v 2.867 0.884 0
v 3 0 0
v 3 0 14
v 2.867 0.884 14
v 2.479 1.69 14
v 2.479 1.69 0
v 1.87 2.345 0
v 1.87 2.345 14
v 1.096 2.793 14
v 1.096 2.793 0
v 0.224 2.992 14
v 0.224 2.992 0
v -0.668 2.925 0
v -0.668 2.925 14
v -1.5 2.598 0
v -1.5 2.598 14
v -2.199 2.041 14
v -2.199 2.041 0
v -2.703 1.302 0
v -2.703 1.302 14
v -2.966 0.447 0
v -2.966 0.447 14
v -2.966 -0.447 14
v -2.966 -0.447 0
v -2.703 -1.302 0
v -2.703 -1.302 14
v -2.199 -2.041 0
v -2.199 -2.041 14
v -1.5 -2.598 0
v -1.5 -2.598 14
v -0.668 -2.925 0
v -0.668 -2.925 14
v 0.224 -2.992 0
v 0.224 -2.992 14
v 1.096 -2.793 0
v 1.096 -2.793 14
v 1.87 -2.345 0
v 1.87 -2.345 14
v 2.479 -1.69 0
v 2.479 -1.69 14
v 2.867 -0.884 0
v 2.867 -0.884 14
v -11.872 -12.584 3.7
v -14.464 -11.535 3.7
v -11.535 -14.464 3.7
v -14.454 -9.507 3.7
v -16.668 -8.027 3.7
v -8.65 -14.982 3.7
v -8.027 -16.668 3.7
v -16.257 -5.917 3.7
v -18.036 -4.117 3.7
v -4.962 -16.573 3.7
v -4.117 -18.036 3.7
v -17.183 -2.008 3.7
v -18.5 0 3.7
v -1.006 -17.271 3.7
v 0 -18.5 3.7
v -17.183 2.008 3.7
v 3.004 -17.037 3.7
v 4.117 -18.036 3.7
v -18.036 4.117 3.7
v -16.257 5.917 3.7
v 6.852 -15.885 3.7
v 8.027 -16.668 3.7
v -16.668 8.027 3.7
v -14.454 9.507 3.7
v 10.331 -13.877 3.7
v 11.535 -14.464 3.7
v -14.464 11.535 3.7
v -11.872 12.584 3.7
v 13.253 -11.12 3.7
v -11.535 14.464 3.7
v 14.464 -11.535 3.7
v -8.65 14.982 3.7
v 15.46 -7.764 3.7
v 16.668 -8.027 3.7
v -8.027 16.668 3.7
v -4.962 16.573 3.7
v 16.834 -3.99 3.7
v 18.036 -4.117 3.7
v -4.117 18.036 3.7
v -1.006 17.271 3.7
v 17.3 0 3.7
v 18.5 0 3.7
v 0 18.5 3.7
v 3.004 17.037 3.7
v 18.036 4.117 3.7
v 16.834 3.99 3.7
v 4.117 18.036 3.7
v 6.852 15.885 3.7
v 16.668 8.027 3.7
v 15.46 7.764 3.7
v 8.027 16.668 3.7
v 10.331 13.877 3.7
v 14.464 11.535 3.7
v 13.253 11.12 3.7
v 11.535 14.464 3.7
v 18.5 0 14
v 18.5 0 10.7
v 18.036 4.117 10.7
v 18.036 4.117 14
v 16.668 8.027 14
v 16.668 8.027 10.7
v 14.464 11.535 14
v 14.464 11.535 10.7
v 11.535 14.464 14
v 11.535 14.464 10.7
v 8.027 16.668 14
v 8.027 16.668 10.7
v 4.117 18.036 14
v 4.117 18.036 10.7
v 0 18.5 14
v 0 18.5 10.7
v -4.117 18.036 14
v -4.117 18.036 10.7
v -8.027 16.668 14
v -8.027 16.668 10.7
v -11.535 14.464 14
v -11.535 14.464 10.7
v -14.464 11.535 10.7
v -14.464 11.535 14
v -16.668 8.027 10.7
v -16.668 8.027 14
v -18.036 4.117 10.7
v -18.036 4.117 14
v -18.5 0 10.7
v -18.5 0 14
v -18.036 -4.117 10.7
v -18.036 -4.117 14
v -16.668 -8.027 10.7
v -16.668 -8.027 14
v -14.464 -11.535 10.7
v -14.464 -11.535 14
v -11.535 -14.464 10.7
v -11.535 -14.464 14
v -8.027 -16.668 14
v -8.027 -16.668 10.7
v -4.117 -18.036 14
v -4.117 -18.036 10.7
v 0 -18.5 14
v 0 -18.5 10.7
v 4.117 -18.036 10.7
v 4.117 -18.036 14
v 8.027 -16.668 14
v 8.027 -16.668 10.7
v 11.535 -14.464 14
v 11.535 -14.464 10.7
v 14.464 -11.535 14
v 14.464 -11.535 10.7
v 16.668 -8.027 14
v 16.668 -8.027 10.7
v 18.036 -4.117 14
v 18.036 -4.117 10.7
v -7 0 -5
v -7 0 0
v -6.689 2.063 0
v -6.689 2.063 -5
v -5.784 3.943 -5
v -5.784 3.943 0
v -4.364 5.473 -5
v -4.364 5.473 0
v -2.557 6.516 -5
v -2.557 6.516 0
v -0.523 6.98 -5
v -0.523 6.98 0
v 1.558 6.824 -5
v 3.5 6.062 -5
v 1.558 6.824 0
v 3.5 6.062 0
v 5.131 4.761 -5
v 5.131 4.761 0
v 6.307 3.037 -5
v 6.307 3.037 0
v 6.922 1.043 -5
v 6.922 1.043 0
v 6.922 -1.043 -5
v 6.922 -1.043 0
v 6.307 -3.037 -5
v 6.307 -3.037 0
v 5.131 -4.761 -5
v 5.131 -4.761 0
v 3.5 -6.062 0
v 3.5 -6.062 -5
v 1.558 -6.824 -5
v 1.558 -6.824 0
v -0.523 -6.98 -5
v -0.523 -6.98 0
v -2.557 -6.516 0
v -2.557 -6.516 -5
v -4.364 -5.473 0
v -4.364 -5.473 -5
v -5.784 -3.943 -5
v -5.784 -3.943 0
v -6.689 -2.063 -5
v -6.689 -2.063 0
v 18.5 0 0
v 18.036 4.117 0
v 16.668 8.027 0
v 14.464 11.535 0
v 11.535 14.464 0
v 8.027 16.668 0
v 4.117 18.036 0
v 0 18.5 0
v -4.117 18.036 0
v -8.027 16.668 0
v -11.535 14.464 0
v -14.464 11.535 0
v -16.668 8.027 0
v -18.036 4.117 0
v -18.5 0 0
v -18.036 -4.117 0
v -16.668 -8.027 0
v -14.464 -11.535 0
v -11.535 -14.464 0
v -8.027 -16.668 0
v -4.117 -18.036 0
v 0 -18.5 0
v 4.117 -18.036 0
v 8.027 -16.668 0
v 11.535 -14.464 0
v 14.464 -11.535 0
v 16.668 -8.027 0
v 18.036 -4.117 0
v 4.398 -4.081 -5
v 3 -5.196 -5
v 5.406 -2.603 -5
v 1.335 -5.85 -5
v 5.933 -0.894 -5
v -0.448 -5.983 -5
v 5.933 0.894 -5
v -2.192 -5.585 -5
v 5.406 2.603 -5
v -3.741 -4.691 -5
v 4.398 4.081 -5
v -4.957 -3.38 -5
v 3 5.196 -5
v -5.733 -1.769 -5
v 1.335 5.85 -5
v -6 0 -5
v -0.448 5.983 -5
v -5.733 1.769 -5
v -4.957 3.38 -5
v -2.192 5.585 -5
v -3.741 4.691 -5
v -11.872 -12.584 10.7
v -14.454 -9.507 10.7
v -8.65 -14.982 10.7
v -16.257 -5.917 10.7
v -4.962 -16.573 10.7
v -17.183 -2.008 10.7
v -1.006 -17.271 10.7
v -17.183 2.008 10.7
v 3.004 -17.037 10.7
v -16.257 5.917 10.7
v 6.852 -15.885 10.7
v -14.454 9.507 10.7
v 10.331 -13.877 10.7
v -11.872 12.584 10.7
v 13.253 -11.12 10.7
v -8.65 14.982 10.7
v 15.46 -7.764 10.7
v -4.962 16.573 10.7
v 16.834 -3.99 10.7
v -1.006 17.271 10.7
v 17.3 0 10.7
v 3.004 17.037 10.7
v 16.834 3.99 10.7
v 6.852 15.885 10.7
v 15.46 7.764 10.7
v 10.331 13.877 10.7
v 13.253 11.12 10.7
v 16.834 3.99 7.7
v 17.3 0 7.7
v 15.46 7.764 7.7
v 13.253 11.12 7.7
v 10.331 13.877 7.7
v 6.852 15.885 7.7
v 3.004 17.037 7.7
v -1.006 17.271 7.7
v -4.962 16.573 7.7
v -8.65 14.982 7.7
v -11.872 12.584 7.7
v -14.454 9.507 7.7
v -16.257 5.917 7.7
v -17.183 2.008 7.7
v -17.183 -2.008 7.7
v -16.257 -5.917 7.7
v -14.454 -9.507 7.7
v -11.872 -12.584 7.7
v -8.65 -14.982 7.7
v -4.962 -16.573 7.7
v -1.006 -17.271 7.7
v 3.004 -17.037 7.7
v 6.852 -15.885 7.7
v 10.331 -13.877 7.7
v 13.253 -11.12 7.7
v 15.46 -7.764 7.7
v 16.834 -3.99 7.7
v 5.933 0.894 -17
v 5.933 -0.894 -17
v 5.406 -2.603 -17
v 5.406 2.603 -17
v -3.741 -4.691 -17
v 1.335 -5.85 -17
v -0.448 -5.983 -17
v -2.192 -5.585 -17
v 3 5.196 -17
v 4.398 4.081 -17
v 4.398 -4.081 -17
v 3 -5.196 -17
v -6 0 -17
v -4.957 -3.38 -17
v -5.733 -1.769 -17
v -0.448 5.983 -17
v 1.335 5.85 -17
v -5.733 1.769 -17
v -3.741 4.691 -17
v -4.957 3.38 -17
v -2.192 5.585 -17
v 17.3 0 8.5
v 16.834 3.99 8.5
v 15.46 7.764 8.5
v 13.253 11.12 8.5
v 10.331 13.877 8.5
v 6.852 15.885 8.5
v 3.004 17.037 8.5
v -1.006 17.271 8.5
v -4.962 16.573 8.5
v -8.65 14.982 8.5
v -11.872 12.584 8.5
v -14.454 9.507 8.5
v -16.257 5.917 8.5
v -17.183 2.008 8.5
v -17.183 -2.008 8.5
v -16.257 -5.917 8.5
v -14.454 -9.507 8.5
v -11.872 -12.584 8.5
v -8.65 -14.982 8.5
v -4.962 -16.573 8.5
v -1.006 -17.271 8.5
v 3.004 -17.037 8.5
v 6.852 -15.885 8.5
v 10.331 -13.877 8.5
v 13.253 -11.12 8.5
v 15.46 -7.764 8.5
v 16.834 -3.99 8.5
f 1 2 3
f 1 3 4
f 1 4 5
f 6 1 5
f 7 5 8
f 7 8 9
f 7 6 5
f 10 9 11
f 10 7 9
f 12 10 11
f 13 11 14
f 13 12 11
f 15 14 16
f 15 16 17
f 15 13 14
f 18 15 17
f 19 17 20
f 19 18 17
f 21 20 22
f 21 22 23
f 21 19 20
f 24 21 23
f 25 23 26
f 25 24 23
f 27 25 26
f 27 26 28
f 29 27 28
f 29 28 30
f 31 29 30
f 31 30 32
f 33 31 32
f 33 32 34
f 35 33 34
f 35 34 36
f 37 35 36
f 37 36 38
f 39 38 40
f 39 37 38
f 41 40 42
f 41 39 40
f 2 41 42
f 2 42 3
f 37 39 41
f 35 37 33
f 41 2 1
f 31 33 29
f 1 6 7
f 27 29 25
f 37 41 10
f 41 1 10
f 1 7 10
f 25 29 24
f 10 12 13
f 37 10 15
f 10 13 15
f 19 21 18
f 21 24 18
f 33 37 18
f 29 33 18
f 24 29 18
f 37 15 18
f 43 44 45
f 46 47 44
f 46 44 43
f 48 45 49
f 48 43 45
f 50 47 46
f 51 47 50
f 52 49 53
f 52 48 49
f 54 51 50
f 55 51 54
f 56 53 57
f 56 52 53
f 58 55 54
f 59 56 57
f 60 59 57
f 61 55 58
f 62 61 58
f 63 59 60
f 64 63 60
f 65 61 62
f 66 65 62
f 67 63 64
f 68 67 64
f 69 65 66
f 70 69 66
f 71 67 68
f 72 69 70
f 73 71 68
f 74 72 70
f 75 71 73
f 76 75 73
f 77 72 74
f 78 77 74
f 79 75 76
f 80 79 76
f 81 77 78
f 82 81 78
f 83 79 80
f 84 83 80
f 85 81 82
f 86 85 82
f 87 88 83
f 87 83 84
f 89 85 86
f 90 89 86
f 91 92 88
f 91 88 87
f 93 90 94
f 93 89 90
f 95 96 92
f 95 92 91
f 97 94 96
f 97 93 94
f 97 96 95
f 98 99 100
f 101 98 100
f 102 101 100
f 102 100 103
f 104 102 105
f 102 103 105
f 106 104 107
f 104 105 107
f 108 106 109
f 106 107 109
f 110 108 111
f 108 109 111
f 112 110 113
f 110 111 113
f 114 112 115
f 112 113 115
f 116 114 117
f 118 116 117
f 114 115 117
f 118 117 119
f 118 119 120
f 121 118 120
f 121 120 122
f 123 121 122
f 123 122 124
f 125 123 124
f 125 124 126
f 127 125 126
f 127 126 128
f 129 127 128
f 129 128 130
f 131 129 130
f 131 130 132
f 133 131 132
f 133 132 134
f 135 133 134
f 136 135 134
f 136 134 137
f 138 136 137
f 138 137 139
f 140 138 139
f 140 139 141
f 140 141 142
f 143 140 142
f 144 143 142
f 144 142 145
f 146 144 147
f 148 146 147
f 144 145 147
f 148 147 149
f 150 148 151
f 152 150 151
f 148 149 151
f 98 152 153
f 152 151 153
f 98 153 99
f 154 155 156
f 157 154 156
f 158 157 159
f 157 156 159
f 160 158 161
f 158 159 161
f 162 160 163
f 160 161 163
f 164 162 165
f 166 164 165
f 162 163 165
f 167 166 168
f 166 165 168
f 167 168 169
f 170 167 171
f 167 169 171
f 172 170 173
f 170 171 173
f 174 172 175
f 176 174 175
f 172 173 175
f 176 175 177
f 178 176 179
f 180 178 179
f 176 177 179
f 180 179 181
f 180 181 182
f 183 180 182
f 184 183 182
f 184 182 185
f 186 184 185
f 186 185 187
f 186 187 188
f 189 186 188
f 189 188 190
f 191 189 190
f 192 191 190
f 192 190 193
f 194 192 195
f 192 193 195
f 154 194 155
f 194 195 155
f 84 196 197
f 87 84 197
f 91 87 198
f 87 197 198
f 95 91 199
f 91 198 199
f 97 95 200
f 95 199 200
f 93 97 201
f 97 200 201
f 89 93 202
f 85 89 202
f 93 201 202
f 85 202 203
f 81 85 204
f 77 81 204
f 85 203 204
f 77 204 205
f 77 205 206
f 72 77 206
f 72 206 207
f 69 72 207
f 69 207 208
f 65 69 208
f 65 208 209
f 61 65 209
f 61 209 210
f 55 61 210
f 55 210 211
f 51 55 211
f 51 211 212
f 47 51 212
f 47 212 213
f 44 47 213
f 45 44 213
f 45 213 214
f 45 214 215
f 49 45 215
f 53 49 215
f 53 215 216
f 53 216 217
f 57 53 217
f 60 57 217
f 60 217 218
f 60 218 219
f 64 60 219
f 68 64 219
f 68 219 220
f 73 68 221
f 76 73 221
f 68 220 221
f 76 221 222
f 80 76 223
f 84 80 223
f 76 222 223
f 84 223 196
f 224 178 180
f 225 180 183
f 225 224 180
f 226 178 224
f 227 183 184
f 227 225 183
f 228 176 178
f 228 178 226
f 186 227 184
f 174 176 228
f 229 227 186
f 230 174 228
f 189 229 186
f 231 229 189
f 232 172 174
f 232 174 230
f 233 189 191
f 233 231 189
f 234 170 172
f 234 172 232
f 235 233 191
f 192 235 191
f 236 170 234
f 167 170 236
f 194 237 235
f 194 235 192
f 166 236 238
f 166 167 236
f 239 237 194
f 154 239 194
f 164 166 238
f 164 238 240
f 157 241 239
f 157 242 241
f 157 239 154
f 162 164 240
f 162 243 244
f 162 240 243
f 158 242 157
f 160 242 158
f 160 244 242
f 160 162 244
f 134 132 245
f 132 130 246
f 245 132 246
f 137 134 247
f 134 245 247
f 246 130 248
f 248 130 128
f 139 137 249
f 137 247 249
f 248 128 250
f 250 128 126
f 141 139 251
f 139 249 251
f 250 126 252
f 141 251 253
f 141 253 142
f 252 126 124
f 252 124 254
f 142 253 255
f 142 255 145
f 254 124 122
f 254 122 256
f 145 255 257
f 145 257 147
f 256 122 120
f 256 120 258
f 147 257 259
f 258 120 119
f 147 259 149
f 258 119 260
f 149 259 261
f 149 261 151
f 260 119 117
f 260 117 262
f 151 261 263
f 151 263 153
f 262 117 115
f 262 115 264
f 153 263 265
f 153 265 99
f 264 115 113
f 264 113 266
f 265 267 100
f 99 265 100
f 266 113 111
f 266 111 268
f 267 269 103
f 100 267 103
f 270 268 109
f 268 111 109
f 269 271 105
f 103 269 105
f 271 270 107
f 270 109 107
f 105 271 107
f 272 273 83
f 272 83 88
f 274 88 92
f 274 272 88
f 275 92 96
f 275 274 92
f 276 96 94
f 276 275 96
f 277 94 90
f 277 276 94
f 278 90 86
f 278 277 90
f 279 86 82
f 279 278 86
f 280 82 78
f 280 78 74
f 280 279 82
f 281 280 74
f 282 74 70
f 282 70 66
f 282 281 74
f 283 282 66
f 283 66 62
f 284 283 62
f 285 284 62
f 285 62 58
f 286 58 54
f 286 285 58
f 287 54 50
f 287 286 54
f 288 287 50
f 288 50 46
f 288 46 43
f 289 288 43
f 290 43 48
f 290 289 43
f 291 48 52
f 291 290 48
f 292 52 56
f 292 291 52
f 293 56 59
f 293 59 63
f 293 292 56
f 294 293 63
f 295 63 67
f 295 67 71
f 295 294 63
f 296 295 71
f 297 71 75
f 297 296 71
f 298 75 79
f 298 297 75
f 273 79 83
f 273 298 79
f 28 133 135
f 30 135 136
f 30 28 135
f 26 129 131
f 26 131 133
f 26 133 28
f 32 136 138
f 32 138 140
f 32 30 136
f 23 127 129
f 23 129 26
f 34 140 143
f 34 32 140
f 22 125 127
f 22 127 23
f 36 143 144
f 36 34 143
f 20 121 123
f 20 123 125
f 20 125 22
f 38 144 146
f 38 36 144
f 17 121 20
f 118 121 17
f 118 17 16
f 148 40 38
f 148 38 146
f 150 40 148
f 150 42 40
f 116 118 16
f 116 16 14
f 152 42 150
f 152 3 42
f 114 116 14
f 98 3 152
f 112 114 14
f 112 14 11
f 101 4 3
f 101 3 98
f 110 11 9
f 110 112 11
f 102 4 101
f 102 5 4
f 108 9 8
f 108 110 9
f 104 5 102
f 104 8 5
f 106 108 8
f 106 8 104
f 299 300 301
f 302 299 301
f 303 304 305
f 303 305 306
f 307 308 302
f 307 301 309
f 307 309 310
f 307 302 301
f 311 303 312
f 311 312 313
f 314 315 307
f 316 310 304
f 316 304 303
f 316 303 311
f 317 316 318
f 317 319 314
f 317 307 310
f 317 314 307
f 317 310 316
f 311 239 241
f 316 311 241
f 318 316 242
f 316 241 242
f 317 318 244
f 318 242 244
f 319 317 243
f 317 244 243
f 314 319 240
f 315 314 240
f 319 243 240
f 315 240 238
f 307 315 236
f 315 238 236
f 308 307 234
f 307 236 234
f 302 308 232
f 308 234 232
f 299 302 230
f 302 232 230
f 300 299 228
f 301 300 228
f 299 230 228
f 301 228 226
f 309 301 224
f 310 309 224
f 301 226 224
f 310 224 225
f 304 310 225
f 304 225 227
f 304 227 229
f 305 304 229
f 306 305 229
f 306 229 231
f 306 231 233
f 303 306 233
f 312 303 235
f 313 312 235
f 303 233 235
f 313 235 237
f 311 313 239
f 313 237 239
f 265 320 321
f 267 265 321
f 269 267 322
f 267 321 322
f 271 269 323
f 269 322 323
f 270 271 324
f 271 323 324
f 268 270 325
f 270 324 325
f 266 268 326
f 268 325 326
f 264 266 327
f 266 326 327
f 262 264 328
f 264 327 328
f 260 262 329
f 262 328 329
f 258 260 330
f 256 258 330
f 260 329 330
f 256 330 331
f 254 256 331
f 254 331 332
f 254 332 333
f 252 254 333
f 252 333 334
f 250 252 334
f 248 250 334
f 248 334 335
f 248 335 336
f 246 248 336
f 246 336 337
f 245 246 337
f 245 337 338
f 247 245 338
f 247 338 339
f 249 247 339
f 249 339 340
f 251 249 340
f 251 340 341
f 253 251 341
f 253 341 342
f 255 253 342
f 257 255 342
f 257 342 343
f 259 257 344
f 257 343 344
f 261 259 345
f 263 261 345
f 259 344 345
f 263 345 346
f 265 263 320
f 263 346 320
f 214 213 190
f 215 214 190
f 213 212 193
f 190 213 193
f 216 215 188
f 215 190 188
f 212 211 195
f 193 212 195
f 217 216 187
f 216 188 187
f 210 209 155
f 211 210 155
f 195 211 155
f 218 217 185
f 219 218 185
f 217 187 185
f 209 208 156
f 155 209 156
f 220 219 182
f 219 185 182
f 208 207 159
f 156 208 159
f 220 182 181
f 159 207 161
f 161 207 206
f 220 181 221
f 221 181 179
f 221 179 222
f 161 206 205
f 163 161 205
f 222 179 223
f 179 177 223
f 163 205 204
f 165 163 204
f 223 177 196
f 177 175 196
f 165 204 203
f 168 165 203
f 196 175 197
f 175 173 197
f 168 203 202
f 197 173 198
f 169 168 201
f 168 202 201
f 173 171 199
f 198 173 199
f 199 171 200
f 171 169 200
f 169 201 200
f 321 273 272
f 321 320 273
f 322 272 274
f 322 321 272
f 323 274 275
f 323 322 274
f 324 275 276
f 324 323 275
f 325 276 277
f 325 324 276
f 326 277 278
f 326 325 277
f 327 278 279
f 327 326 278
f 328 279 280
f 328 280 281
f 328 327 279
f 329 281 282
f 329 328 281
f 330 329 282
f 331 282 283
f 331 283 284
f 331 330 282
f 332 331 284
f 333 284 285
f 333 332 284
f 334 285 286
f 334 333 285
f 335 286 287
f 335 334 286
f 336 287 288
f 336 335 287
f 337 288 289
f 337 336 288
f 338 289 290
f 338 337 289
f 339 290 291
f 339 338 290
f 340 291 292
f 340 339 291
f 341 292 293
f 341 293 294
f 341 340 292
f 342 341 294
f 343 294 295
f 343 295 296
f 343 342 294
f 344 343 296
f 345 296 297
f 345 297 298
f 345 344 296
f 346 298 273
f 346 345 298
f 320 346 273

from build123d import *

# Parameters (mm, degrees)
SKETCH_1_R          = 18.5
SKETCH_1_R_2        = 3
EXTRUDE_1_DEPTH     = 14
CUT_EXTRUDE_START   = -2.2
SKETCH_2_R          = 18.5
SKETCH_2_R_2        = 17.3
CUT_EXTRUDE_1_DEPTH = 2.2
SKETCH_2_2_R        = 18.5
SKETCH_2_2_R_2      = 17.3
CUT_EXTRUDE_2_DEPTH = 0.8
CUT_EXTRUDE_START_2 = -4
SKETCH_2_4_R        = 18.5
SKETCH_2_4_R_2      = 17.3
CUT_EXTRUDE_3_DEPTH = 4
SKETCH_2_6_R        = 18.5
SKETCH_2_6_R_2      = 17.3
CUT_EXTRUDE_5_DEPTH = 3
SKETCH_3_R          = 7
EXTRUDE_3_DEPTH     = 5
SKETCH_4_R          = 6
EXTRUDE_4_DEPTH     = 12


with BuildPart() as part:
    # 草图1 → 凸台-拉伸1 (new body)
    with BuildSketch(Plane.XY):
        Circle(SKETCH_1_R)
        Circle(SKETCH_1_R_2, mode=Mode.SUBTRACT)
    extrude(amount=EXTRUDE_1_DEPTH)

    # 草图2 → 切除-拉伸1 (cut)
    with BuildSketch(Plane.XY.offset(7.7).offset(CUT_EXTRUDE_START)):
        Circle(SKETCH_2_R)
        Circle(SKETCH_2_R_2, mode=Mode.SUBTRACT)
    extrude(amount=CUT_EXTRUDE_1_DEPTH, mode=Mode.SUBTRACT)

    # 草图2<2> → 切除-拉伸2 (cut)
    with BuildSketch(Plane.XY.offset(7.7)):
        Circle(SKETCH_2_2_R)
        Circle(SKETCH_2_2_R_2, mode=Mode.SUBTRACT)
    extrude(amount=CUT_EXTRUDE_2_DEPTH, mode=Mode.SUBTRACT)

    # 草图2<4> → 切除-拉伸3 (cut)
    with BuildSketch(Plane.XY.offset(7.7).offset(CUT_EXTRUDE_START_2)):
        Circle(SKETCH_2_4_R)
        Circle(SKETCH_2_4_R_2, mode=Mode.SUBTRACT)
    extrude(amount=CUT_EXTRUDE_3_DEPTH, mode=Mode.SUBTRACT)

    # 草图2<6> → 切除-拉伸5 (cut)
    with BuildSketch(Plane.XY.offset(7.7)):
        Circle(SKETCH_2_6_R)
        Circle(SKETCH_2_6_R_2, mode=Mode.SUBTRACT)
    extrude(amount=CUT_EXTRUDE_5_DEPTH, mode=Mode.SUBTRACT)

    # 草图3 → 凸台-拉伸3 (add)
    with BuildSketch(Plane(origin=(0, 0, 0), x_dir=(-1, 0, 0), z_dir=(0, 0, -1))):
        Circle(SKETCH_3_R)
    extrude(amount=EXTRUDE_3_DEPTH)

    # 草图4 → 凸台-拉伸4 (add)
    with BuildSketch(Plane(origin=(0, 0, -5), x_dir=(-1, 0, 0), z_dir=(0, 0, -1))):
        Circle(SKETCH_4_R)
    extrude(amount=EXTRUDE_4_DEPTH)


solid = part.part
